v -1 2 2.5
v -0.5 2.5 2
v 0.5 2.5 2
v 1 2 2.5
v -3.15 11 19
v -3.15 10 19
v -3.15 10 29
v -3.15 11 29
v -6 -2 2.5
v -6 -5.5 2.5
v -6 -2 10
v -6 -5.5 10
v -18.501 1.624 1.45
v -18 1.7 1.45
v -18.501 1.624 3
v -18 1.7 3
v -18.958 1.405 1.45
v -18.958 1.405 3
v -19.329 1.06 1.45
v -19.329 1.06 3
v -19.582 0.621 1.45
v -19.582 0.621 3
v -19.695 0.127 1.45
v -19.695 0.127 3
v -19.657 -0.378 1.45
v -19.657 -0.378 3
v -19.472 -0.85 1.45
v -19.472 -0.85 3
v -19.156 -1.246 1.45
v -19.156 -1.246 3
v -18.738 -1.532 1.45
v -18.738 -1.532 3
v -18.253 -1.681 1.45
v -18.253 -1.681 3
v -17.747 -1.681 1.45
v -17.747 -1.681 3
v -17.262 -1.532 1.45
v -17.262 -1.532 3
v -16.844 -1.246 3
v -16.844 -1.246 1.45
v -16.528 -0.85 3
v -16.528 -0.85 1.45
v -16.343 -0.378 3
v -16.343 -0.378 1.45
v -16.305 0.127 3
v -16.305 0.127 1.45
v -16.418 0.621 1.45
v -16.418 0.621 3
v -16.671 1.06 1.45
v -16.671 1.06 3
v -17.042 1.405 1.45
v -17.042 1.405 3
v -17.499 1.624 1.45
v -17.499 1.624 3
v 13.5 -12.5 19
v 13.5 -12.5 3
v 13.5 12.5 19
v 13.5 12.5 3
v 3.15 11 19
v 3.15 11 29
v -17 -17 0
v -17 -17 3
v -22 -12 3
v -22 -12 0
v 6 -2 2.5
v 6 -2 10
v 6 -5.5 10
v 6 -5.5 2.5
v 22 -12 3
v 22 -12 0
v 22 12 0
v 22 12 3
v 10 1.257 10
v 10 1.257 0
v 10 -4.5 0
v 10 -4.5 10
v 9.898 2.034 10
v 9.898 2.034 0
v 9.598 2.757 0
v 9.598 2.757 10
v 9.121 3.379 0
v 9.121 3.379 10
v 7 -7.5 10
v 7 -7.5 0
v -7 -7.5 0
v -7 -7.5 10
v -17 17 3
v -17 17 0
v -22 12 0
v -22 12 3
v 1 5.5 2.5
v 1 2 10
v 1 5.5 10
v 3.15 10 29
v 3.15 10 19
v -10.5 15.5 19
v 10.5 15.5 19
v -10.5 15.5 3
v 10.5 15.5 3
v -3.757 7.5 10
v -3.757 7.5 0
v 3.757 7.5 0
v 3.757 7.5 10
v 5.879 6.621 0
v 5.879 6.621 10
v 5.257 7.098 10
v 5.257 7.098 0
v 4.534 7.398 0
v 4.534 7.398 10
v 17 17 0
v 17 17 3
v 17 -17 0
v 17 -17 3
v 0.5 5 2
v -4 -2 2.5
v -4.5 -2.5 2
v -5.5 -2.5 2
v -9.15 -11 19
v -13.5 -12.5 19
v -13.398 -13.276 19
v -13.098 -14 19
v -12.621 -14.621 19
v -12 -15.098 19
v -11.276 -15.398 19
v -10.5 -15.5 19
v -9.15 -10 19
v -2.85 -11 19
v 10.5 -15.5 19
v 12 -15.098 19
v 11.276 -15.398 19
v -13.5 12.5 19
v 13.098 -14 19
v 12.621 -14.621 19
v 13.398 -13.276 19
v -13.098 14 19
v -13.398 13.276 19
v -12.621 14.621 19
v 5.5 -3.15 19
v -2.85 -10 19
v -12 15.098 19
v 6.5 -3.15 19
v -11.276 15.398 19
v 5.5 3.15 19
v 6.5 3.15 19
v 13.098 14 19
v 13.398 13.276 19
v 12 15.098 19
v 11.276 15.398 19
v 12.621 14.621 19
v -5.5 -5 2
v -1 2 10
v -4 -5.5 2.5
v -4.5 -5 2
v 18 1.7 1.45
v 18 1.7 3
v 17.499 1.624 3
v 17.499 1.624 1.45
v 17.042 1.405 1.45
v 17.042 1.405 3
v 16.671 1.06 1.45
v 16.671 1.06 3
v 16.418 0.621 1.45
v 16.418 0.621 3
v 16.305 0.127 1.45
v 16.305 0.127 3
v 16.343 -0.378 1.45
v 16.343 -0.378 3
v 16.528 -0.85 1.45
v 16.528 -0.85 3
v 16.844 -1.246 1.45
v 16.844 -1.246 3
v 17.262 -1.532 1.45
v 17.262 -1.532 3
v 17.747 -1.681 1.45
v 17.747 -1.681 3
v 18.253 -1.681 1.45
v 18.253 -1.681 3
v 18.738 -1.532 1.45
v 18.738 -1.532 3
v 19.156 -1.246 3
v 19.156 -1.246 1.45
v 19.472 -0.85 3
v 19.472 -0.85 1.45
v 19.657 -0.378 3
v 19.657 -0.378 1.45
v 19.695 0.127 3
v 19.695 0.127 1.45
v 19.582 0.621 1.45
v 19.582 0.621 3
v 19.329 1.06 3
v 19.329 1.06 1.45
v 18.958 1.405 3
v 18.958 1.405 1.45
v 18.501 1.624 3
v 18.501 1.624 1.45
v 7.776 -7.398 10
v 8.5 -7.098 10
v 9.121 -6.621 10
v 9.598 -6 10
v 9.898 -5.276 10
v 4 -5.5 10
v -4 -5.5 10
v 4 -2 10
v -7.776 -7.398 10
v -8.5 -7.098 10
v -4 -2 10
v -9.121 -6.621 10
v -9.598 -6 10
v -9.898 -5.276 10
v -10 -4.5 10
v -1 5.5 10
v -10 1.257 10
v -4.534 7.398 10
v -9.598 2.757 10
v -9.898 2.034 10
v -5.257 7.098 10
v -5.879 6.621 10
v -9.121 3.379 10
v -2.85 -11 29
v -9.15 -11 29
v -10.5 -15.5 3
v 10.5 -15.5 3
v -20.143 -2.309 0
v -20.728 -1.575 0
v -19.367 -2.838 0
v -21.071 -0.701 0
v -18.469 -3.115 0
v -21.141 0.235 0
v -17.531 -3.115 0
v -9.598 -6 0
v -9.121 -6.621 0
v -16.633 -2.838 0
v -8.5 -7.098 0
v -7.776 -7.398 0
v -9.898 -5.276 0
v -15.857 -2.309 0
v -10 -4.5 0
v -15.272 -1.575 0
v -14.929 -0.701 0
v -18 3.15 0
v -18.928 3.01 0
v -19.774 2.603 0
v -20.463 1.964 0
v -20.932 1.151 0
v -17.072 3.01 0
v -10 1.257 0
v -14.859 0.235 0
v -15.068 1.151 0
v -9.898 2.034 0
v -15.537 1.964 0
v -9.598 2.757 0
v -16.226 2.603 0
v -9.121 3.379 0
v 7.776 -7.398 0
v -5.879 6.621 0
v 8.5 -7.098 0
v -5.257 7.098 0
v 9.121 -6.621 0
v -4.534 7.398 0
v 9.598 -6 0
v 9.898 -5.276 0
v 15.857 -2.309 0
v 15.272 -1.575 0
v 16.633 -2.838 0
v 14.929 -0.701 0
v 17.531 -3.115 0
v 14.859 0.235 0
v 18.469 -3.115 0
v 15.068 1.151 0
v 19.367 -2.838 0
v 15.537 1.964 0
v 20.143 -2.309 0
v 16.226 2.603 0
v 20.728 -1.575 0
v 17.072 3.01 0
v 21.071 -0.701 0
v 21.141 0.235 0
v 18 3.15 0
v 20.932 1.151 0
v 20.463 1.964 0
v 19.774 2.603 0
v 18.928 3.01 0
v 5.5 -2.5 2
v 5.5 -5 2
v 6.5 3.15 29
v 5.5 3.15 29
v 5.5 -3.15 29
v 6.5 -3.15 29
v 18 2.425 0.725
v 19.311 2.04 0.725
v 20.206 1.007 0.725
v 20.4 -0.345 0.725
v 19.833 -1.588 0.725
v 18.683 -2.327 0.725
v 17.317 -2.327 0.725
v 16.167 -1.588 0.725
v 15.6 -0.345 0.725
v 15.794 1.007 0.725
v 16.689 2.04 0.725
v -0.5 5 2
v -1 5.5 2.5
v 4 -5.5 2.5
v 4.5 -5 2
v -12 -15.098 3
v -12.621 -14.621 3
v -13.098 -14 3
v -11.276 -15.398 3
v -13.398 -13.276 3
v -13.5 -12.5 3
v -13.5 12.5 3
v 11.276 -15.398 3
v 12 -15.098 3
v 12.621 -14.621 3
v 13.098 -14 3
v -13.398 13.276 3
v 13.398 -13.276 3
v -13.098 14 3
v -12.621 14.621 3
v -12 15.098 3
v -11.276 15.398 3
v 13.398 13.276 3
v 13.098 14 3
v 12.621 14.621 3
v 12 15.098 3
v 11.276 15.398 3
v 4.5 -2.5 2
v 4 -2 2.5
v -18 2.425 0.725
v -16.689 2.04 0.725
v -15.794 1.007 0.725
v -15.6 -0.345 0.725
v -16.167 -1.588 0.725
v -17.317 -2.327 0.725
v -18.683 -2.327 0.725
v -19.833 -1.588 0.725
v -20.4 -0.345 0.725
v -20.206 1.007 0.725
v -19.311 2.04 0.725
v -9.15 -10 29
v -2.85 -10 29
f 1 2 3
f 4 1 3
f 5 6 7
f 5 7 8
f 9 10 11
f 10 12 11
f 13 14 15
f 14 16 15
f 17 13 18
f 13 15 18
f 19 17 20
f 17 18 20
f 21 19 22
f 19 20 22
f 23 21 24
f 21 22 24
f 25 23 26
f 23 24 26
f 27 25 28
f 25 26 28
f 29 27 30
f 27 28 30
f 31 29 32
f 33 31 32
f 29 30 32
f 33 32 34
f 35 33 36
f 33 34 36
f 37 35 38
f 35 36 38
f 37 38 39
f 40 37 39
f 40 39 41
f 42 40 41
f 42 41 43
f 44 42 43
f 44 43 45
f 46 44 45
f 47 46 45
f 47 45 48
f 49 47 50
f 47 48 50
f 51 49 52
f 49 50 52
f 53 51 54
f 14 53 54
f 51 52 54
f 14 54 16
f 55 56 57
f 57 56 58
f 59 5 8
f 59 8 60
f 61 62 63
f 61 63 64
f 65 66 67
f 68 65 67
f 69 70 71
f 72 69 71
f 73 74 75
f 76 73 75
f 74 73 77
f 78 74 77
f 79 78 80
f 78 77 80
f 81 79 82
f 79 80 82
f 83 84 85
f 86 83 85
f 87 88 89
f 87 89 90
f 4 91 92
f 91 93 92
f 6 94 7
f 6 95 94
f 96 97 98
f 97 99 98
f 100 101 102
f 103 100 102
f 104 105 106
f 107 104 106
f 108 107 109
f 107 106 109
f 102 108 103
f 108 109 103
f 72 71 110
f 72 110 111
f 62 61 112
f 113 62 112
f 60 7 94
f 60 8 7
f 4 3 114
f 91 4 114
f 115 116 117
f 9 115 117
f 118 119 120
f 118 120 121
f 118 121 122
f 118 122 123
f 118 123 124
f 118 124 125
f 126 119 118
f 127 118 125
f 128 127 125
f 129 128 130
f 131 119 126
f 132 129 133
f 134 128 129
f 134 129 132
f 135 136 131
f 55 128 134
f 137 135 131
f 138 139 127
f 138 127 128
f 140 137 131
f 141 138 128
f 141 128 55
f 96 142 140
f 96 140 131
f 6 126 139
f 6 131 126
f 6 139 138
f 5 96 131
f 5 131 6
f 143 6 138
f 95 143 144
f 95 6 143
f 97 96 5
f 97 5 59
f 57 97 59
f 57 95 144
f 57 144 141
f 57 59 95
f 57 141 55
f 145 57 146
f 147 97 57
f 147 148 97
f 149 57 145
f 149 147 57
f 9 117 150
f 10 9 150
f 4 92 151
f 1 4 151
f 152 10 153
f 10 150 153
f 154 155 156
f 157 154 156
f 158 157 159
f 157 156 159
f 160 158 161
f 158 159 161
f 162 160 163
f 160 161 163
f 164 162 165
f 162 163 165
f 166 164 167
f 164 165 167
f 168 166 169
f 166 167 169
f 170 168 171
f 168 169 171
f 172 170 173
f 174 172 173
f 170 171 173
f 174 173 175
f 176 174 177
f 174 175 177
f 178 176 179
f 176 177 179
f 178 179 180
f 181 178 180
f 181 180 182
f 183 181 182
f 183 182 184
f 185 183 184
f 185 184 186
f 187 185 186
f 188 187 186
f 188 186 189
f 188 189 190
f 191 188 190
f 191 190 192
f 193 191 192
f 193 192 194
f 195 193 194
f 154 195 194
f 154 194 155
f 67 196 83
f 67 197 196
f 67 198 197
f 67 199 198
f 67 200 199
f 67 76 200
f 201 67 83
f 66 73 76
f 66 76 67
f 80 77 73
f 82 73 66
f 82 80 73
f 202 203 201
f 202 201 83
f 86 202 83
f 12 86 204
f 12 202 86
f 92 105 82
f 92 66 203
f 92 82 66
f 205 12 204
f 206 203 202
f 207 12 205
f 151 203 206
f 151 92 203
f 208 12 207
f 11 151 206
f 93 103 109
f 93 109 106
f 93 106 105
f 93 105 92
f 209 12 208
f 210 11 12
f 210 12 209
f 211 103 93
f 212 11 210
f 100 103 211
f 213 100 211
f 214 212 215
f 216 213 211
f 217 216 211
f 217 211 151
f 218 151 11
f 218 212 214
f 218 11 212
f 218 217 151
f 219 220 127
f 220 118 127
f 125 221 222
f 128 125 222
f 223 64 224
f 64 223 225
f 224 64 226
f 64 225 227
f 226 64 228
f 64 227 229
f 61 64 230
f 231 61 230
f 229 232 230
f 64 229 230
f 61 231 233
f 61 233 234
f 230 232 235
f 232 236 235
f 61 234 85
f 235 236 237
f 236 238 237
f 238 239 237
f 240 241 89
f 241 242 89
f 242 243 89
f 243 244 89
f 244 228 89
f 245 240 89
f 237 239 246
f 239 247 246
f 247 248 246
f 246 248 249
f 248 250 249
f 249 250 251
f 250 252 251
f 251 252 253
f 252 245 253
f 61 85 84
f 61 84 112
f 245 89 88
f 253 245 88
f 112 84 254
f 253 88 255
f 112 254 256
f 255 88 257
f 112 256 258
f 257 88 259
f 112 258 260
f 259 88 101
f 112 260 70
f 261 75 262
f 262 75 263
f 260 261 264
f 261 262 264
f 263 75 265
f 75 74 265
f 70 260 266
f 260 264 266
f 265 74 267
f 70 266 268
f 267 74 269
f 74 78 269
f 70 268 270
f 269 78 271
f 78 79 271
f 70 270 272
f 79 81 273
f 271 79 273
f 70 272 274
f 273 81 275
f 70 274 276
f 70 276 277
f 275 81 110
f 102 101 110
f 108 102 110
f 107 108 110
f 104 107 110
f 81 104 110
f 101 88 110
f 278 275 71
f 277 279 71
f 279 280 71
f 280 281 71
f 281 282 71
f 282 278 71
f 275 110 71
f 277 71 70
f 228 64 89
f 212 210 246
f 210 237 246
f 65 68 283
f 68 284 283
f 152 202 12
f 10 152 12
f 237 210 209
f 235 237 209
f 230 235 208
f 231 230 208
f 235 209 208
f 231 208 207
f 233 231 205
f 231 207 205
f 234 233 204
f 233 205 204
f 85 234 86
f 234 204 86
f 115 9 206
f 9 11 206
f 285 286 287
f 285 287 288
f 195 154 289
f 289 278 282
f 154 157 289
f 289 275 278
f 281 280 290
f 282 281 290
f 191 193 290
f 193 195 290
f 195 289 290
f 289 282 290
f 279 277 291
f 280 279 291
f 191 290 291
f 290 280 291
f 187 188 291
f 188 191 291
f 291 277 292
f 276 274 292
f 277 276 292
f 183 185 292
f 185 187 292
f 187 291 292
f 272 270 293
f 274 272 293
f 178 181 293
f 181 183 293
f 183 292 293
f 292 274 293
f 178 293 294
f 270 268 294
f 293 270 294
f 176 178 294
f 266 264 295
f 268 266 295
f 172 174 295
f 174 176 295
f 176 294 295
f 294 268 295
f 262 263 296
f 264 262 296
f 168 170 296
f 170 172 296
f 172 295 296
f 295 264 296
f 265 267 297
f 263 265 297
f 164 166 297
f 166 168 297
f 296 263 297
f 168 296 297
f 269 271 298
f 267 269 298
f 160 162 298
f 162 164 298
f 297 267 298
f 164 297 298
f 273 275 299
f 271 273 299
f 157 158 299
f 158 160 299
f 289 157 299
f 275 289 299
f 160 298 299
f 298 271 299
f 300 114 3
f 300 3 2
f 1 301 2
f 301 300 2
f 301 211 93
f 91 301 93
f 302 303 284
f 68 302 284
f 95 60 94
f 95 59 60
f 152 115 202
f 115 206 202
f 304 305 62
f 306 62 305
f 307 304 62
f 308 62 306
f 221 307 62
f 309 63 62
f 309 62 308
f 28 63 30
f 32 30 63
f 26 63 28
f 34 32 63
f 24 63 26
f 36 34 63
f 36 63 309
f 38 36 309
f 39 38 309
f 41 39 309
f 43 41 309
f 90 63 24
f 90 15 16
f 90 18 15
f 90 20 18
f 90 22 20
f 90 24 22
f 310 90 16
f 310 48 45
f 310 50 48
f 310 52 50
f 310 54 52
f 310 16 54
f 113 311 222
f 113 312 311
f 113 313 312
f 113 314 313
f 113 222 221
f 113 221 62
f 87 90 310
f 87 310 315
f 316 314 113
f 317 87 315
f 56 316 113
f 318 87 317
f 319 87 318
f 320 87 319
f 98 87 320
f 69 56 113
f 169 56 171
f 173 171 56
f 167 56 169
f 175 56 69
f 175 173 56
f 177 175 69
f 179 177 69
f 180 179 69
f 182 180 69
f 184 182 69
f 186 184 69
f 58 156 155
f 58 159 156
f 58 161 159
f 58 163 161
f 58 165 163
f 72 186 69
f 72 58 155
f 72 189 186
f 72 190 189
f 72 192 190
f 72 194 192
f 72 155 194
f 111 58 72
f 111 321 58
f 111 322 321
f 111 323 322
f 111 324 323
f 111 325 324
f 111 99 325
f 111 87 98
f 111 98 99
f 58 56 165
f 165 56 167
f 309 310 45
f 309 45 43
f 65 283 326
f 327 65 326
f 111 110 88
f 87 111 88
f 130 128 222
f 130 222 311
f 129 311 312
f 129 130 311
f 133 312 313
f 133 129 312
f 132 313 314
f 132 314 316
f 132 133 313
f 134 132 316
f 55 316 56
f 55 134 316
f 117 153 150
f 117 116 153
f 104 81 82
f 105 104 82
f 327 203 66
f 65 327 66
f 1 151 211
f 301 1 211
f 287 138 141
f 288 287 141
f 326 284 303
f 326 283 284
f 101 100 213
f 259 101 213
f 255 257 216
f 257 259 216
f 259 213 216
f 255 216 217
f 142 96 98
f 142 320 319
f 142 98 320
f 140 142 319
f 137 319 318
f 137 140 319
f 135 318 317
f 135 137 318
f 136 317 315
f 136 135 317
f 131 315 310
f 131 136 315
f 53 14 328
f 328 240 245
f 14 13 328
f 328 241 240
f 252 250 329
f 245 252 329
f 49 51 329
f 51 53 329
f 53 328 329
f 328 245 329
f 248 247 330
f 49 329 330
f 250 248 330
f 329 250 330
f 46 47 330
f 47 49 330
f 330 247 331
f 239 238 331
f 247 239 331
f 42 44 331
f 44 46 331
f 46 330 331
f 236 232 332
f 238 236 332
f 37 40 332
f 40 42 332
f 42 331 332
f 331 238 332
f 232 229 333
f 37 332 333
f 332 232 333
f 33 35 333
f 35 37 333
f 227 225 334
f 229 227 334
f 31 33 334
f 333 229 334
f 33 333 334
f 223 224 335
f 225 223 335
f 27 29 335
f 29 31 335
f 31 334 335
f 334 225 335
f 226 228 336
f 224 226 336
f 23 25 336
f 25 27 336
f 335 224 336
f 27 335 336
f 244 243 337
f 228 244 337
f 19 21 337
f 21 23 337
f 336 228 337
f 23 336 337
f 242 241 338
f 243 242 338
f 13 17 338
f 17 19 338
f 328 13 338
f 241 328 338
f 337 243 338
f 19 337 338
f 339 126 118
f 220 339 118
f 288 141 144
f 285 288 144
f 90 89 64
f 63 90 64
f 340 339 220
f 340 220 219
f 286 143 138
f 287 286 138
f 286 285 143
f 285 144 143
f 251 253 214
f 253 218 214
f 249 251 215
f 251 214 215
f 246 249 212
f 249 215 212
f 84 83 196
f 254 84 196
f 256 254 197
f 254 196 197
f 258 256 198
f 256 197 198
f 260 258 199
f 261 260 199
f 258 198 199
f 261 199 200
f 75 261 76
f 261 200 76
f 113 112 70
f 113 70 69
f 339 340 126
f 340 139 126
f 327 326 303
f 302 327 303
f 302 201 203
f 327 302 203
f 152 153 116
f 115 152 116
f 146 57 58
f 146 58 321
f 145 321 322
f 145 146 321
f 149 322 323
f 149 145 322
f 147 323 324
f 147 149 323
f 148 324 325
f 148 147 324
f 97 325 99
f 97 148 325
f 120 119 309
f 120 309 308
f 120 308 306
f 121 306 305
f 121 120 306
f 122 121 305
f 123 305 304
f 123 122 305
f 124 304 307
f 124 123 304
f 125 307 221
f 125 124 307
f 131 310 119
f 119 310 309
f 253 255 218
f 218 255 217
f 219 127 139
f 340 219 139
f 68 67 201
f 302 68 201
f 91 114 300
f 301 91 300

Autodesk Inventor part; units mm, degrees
ref_plane "YZ Plane" through (0, 0, 0) normal (1, 0, 0) x (0, 1, 0)
ref_plane "XZ Plane" through (0, 0, 0) normal (0, 1, 0) x (-1, 0, 0)
ref_plane "XY Plane" through (0, 0, 0) normal (0, 0, 1) x (1, 0, 0)
sketch "Sketch1" plane through (0, 0, 0) normal (0, 0, 1) x (1, 0, 0)
  line L0 (-22, -17) -> (22, -17)
  line L1 (22, -17) -> (22, 17)
  line L2 (22, 17) -> (-22, 17)
  line L3 (-22, 17) -> (-22, -17)
  line L4 (-22, -17) -> (22, 17) construction
  line L5 (22, -17) -> (-22, 17) construction
  point P0 (0, 0)
  dimension "d0" = 44
  dimension "d1" = 34
extrude "Extrusion1" add sketch "Sketch1" along normal blind 3
chamfer "Chamfer1" distance 5 angle 45 4 edges at (22, 17, 1.5) (-22, 17, 1.5) (22, -17, 1.5) (-22, -17, 1.5)
sketch "Sketch2" plane through (0, 0, 3) normal (0, 0, 1) x (1, 0, 0)
  line L0 (-13.5, -15.5) -> (13.5, -15.5)
  line L1 (13.5, -15.5) -> (13.5, 15.5)
  line L2 (13.5, 15.5) -> (-13.5, 15.5)
  line L3 (-13.5, 15.5) -> (-13.5, -15.5)
  line L4 (-13.5, -15.5) -> (13.5, 15.5) construction
  line L5 (13.5, -15.5) -> (-13.5, 15.5) construction
  point P0 (0, 0)
  dimension "d7" = 27
  dimension "d8" = 31
extrude "Extrusion2" add sketch "Sketch2" along normal blind 16
fillet "Fillet1" radius 3 4 edges at (13.5, -15.5, 11) (13.5, 15.5, 11) (-13.5, 15.5, 11) (-13.5, -15.5, 11)
sketch "Sketch3" plane through (0, 0, 0) normal (0, 0, -1) x (-1, 0, 0)
  line L0 (-18, 0) -> (18, 0) construction
  point P0 (0, 0)
  point P1 (0, 0)
  dimension "d12" = 36
hole "Hole1" at (18, 0, 0) at (-18, 0, 0) direction (0, 0, 1) diameter 3.4 depth 8 tip angle 118 countersink diameter 6.3 countersink angle 90 clearance for "Countersunk Flat Head Screw DIN EN ISO 2009" size "M3" standard "DIN"
sketch "Sketch4" plane through (0, 0, 19) normal (0, 0, 1) x (1, 0, 0)
  line L0 (-3.15, 11) -> (3.15, 11)
  line L1 (3.15, 11) -> (3.15, 10)
  line L2 (3.15, 10) -> (-3.15, 10)
  line L3 (-3.15, 10) -> (-3.15, 11)
  line L4 (-3.15, 11) -> (3.15, 10) construction
  line L5 (3.15, 11) -> (-3.15, 10) construction
  line L6 (5.5, -3.15) -> (6.5, -3.15)
  line L7 (6.5, -3.15) -> (6.5, 3.15)
  line L8 (6.5, 3.15) -> (5.5, 3.15)
  line L9 (5.5, 3.15) -> (5.5, -3.15)
  line L10 (5.5, -3.15) -> (6.5, 3.15) construction
  line L11 (6.5, -3.15) -> (5.5, 3.15) construction
  line L12 (-9.15, -11) -> (-2.85, -11)
  line L13 (-2.85, -11) -> (-2.85, -10)
  line L14 (-2.85, -10) -> (-9.15, -10)
  line L15 (-9.15, -10) -> (-9.15, -11)
  line L16 (-9.15, -11) -> (-2.85, -10) construction
  line L17 (-2.85, -11) -> (-9.15, -10) construction
  point P0 (0, 0)
  point P1 (0, 10.5)
  point P2 (6, 0)
  point P3 (-6, -10.5)
  point P4 (0, 10.5)
  point P5 (6, 0)
  dimension "d20" = 6.3
  dimension "d21" = 1
  dimension "d22" = 1
  dimension "d23" = 6.3
  dimension "d24" = 6.3
  dimension "d25" = 1
  dimension "d26" = 10
  dimension "d27" = 6
  dimension "d28" = 10
  dimension "d29" = 6
extrude "Extrusion3" add sketch "Sketch4" along normal blind 10
sketch "Sketch5" plane through (0, 0, 0) normal (0, 0, -1) x (-1, 0, 0)
  line L0 (-10, -7.5) -> (10, -7.5)
  line L1 (10, -7.5) -> (10, 7.5)
  line L2 (10, 7.5) -> (-10, 7.5)
  line L3 (-10, 7.5) -> (-10, -7.5)
  line L4 (-10, -7.5) -> (10, 7.5) construction
  line L5 (10, -7.5) -> (-10, 7.5) construction
  point P0 (0, 0)
  dimension "d32" = 20
  dimension "d33" = 15
extrude "Extrusion4" cut sketch "Sketch5" against normal blind 10
fillet "Fillet2" radius 3 2 edges at (-10, -7.5, 5) (10, -7.5, 5)
chamfer "Chamfer2" distance 5 angle 45 2 edges at (-10, 7.5, 5) (10, 7.5, 5)
fillet "Fillet3" radius 3 4 edges at (10, 2.5, 5) (5, 7.5, 5) (-5, 7.5, 5) (-10, 2.5, 5)
sketch "Sketch6" plane through (0, 0, 10) normal (0, 0, -1) x (-1, 0, 0)
  line L0 (-1, 2) -> (1, 2)
  line L1 (1, 2) -> (1, 5.5)
  line L2 (1, 5.5) -> (-1, 5.5)
  line L3 (-1, 5.5) -> (-1, 2)
  line L4 (-6, -5.5) -> (-4, -5.5)
  line L5 (-4, -5.5) -> (-4, -2)
  line L6 (-4, -2) -> (-6, -2)
  line L7 (-6, -2) -> (-6, -5.5)
  line L8 (4, -5.5) -> (6, -5.5)
  line L9 (6, -5.5) -> (6, -2)
  line L10 (6, -2) -> (4, -2)
  line L11 (4, -2) -> (4, -5.5)
  line L12 (-4, -2) -> (4, -2) construction
  point P0 (0, 0)
  point P1 (0, 2)
  point P2 (0, -2)
  dimension "d41" = 2
  dimension "d42" = 2
  dimension "d43" = 2
  dimension "d44" = 3.5
  dimension "d45" = 3.5
  dimension "d46" = 2
  dimension "d47" = 2
  dimension "d48" = 8
extrude "Extrusion5" add sketch "Sketch6" along normal blind 8
chamfer "Chamfer3" distance 0.5 angle 45 12 edges at (5, -2, 2) (6, -3.75, 2) (4, -3.75, 2) (5, -5.5, 2) (0, 2, 2) (1, 3.75, 2) (0, 5.5, 2) (-1, 3.75, 2) (-4, -3.75, 2) (-5, -2, 2) (-6, -3.75, 2) (-5, -5.5, 2)
properties part number "Netzstecker"
